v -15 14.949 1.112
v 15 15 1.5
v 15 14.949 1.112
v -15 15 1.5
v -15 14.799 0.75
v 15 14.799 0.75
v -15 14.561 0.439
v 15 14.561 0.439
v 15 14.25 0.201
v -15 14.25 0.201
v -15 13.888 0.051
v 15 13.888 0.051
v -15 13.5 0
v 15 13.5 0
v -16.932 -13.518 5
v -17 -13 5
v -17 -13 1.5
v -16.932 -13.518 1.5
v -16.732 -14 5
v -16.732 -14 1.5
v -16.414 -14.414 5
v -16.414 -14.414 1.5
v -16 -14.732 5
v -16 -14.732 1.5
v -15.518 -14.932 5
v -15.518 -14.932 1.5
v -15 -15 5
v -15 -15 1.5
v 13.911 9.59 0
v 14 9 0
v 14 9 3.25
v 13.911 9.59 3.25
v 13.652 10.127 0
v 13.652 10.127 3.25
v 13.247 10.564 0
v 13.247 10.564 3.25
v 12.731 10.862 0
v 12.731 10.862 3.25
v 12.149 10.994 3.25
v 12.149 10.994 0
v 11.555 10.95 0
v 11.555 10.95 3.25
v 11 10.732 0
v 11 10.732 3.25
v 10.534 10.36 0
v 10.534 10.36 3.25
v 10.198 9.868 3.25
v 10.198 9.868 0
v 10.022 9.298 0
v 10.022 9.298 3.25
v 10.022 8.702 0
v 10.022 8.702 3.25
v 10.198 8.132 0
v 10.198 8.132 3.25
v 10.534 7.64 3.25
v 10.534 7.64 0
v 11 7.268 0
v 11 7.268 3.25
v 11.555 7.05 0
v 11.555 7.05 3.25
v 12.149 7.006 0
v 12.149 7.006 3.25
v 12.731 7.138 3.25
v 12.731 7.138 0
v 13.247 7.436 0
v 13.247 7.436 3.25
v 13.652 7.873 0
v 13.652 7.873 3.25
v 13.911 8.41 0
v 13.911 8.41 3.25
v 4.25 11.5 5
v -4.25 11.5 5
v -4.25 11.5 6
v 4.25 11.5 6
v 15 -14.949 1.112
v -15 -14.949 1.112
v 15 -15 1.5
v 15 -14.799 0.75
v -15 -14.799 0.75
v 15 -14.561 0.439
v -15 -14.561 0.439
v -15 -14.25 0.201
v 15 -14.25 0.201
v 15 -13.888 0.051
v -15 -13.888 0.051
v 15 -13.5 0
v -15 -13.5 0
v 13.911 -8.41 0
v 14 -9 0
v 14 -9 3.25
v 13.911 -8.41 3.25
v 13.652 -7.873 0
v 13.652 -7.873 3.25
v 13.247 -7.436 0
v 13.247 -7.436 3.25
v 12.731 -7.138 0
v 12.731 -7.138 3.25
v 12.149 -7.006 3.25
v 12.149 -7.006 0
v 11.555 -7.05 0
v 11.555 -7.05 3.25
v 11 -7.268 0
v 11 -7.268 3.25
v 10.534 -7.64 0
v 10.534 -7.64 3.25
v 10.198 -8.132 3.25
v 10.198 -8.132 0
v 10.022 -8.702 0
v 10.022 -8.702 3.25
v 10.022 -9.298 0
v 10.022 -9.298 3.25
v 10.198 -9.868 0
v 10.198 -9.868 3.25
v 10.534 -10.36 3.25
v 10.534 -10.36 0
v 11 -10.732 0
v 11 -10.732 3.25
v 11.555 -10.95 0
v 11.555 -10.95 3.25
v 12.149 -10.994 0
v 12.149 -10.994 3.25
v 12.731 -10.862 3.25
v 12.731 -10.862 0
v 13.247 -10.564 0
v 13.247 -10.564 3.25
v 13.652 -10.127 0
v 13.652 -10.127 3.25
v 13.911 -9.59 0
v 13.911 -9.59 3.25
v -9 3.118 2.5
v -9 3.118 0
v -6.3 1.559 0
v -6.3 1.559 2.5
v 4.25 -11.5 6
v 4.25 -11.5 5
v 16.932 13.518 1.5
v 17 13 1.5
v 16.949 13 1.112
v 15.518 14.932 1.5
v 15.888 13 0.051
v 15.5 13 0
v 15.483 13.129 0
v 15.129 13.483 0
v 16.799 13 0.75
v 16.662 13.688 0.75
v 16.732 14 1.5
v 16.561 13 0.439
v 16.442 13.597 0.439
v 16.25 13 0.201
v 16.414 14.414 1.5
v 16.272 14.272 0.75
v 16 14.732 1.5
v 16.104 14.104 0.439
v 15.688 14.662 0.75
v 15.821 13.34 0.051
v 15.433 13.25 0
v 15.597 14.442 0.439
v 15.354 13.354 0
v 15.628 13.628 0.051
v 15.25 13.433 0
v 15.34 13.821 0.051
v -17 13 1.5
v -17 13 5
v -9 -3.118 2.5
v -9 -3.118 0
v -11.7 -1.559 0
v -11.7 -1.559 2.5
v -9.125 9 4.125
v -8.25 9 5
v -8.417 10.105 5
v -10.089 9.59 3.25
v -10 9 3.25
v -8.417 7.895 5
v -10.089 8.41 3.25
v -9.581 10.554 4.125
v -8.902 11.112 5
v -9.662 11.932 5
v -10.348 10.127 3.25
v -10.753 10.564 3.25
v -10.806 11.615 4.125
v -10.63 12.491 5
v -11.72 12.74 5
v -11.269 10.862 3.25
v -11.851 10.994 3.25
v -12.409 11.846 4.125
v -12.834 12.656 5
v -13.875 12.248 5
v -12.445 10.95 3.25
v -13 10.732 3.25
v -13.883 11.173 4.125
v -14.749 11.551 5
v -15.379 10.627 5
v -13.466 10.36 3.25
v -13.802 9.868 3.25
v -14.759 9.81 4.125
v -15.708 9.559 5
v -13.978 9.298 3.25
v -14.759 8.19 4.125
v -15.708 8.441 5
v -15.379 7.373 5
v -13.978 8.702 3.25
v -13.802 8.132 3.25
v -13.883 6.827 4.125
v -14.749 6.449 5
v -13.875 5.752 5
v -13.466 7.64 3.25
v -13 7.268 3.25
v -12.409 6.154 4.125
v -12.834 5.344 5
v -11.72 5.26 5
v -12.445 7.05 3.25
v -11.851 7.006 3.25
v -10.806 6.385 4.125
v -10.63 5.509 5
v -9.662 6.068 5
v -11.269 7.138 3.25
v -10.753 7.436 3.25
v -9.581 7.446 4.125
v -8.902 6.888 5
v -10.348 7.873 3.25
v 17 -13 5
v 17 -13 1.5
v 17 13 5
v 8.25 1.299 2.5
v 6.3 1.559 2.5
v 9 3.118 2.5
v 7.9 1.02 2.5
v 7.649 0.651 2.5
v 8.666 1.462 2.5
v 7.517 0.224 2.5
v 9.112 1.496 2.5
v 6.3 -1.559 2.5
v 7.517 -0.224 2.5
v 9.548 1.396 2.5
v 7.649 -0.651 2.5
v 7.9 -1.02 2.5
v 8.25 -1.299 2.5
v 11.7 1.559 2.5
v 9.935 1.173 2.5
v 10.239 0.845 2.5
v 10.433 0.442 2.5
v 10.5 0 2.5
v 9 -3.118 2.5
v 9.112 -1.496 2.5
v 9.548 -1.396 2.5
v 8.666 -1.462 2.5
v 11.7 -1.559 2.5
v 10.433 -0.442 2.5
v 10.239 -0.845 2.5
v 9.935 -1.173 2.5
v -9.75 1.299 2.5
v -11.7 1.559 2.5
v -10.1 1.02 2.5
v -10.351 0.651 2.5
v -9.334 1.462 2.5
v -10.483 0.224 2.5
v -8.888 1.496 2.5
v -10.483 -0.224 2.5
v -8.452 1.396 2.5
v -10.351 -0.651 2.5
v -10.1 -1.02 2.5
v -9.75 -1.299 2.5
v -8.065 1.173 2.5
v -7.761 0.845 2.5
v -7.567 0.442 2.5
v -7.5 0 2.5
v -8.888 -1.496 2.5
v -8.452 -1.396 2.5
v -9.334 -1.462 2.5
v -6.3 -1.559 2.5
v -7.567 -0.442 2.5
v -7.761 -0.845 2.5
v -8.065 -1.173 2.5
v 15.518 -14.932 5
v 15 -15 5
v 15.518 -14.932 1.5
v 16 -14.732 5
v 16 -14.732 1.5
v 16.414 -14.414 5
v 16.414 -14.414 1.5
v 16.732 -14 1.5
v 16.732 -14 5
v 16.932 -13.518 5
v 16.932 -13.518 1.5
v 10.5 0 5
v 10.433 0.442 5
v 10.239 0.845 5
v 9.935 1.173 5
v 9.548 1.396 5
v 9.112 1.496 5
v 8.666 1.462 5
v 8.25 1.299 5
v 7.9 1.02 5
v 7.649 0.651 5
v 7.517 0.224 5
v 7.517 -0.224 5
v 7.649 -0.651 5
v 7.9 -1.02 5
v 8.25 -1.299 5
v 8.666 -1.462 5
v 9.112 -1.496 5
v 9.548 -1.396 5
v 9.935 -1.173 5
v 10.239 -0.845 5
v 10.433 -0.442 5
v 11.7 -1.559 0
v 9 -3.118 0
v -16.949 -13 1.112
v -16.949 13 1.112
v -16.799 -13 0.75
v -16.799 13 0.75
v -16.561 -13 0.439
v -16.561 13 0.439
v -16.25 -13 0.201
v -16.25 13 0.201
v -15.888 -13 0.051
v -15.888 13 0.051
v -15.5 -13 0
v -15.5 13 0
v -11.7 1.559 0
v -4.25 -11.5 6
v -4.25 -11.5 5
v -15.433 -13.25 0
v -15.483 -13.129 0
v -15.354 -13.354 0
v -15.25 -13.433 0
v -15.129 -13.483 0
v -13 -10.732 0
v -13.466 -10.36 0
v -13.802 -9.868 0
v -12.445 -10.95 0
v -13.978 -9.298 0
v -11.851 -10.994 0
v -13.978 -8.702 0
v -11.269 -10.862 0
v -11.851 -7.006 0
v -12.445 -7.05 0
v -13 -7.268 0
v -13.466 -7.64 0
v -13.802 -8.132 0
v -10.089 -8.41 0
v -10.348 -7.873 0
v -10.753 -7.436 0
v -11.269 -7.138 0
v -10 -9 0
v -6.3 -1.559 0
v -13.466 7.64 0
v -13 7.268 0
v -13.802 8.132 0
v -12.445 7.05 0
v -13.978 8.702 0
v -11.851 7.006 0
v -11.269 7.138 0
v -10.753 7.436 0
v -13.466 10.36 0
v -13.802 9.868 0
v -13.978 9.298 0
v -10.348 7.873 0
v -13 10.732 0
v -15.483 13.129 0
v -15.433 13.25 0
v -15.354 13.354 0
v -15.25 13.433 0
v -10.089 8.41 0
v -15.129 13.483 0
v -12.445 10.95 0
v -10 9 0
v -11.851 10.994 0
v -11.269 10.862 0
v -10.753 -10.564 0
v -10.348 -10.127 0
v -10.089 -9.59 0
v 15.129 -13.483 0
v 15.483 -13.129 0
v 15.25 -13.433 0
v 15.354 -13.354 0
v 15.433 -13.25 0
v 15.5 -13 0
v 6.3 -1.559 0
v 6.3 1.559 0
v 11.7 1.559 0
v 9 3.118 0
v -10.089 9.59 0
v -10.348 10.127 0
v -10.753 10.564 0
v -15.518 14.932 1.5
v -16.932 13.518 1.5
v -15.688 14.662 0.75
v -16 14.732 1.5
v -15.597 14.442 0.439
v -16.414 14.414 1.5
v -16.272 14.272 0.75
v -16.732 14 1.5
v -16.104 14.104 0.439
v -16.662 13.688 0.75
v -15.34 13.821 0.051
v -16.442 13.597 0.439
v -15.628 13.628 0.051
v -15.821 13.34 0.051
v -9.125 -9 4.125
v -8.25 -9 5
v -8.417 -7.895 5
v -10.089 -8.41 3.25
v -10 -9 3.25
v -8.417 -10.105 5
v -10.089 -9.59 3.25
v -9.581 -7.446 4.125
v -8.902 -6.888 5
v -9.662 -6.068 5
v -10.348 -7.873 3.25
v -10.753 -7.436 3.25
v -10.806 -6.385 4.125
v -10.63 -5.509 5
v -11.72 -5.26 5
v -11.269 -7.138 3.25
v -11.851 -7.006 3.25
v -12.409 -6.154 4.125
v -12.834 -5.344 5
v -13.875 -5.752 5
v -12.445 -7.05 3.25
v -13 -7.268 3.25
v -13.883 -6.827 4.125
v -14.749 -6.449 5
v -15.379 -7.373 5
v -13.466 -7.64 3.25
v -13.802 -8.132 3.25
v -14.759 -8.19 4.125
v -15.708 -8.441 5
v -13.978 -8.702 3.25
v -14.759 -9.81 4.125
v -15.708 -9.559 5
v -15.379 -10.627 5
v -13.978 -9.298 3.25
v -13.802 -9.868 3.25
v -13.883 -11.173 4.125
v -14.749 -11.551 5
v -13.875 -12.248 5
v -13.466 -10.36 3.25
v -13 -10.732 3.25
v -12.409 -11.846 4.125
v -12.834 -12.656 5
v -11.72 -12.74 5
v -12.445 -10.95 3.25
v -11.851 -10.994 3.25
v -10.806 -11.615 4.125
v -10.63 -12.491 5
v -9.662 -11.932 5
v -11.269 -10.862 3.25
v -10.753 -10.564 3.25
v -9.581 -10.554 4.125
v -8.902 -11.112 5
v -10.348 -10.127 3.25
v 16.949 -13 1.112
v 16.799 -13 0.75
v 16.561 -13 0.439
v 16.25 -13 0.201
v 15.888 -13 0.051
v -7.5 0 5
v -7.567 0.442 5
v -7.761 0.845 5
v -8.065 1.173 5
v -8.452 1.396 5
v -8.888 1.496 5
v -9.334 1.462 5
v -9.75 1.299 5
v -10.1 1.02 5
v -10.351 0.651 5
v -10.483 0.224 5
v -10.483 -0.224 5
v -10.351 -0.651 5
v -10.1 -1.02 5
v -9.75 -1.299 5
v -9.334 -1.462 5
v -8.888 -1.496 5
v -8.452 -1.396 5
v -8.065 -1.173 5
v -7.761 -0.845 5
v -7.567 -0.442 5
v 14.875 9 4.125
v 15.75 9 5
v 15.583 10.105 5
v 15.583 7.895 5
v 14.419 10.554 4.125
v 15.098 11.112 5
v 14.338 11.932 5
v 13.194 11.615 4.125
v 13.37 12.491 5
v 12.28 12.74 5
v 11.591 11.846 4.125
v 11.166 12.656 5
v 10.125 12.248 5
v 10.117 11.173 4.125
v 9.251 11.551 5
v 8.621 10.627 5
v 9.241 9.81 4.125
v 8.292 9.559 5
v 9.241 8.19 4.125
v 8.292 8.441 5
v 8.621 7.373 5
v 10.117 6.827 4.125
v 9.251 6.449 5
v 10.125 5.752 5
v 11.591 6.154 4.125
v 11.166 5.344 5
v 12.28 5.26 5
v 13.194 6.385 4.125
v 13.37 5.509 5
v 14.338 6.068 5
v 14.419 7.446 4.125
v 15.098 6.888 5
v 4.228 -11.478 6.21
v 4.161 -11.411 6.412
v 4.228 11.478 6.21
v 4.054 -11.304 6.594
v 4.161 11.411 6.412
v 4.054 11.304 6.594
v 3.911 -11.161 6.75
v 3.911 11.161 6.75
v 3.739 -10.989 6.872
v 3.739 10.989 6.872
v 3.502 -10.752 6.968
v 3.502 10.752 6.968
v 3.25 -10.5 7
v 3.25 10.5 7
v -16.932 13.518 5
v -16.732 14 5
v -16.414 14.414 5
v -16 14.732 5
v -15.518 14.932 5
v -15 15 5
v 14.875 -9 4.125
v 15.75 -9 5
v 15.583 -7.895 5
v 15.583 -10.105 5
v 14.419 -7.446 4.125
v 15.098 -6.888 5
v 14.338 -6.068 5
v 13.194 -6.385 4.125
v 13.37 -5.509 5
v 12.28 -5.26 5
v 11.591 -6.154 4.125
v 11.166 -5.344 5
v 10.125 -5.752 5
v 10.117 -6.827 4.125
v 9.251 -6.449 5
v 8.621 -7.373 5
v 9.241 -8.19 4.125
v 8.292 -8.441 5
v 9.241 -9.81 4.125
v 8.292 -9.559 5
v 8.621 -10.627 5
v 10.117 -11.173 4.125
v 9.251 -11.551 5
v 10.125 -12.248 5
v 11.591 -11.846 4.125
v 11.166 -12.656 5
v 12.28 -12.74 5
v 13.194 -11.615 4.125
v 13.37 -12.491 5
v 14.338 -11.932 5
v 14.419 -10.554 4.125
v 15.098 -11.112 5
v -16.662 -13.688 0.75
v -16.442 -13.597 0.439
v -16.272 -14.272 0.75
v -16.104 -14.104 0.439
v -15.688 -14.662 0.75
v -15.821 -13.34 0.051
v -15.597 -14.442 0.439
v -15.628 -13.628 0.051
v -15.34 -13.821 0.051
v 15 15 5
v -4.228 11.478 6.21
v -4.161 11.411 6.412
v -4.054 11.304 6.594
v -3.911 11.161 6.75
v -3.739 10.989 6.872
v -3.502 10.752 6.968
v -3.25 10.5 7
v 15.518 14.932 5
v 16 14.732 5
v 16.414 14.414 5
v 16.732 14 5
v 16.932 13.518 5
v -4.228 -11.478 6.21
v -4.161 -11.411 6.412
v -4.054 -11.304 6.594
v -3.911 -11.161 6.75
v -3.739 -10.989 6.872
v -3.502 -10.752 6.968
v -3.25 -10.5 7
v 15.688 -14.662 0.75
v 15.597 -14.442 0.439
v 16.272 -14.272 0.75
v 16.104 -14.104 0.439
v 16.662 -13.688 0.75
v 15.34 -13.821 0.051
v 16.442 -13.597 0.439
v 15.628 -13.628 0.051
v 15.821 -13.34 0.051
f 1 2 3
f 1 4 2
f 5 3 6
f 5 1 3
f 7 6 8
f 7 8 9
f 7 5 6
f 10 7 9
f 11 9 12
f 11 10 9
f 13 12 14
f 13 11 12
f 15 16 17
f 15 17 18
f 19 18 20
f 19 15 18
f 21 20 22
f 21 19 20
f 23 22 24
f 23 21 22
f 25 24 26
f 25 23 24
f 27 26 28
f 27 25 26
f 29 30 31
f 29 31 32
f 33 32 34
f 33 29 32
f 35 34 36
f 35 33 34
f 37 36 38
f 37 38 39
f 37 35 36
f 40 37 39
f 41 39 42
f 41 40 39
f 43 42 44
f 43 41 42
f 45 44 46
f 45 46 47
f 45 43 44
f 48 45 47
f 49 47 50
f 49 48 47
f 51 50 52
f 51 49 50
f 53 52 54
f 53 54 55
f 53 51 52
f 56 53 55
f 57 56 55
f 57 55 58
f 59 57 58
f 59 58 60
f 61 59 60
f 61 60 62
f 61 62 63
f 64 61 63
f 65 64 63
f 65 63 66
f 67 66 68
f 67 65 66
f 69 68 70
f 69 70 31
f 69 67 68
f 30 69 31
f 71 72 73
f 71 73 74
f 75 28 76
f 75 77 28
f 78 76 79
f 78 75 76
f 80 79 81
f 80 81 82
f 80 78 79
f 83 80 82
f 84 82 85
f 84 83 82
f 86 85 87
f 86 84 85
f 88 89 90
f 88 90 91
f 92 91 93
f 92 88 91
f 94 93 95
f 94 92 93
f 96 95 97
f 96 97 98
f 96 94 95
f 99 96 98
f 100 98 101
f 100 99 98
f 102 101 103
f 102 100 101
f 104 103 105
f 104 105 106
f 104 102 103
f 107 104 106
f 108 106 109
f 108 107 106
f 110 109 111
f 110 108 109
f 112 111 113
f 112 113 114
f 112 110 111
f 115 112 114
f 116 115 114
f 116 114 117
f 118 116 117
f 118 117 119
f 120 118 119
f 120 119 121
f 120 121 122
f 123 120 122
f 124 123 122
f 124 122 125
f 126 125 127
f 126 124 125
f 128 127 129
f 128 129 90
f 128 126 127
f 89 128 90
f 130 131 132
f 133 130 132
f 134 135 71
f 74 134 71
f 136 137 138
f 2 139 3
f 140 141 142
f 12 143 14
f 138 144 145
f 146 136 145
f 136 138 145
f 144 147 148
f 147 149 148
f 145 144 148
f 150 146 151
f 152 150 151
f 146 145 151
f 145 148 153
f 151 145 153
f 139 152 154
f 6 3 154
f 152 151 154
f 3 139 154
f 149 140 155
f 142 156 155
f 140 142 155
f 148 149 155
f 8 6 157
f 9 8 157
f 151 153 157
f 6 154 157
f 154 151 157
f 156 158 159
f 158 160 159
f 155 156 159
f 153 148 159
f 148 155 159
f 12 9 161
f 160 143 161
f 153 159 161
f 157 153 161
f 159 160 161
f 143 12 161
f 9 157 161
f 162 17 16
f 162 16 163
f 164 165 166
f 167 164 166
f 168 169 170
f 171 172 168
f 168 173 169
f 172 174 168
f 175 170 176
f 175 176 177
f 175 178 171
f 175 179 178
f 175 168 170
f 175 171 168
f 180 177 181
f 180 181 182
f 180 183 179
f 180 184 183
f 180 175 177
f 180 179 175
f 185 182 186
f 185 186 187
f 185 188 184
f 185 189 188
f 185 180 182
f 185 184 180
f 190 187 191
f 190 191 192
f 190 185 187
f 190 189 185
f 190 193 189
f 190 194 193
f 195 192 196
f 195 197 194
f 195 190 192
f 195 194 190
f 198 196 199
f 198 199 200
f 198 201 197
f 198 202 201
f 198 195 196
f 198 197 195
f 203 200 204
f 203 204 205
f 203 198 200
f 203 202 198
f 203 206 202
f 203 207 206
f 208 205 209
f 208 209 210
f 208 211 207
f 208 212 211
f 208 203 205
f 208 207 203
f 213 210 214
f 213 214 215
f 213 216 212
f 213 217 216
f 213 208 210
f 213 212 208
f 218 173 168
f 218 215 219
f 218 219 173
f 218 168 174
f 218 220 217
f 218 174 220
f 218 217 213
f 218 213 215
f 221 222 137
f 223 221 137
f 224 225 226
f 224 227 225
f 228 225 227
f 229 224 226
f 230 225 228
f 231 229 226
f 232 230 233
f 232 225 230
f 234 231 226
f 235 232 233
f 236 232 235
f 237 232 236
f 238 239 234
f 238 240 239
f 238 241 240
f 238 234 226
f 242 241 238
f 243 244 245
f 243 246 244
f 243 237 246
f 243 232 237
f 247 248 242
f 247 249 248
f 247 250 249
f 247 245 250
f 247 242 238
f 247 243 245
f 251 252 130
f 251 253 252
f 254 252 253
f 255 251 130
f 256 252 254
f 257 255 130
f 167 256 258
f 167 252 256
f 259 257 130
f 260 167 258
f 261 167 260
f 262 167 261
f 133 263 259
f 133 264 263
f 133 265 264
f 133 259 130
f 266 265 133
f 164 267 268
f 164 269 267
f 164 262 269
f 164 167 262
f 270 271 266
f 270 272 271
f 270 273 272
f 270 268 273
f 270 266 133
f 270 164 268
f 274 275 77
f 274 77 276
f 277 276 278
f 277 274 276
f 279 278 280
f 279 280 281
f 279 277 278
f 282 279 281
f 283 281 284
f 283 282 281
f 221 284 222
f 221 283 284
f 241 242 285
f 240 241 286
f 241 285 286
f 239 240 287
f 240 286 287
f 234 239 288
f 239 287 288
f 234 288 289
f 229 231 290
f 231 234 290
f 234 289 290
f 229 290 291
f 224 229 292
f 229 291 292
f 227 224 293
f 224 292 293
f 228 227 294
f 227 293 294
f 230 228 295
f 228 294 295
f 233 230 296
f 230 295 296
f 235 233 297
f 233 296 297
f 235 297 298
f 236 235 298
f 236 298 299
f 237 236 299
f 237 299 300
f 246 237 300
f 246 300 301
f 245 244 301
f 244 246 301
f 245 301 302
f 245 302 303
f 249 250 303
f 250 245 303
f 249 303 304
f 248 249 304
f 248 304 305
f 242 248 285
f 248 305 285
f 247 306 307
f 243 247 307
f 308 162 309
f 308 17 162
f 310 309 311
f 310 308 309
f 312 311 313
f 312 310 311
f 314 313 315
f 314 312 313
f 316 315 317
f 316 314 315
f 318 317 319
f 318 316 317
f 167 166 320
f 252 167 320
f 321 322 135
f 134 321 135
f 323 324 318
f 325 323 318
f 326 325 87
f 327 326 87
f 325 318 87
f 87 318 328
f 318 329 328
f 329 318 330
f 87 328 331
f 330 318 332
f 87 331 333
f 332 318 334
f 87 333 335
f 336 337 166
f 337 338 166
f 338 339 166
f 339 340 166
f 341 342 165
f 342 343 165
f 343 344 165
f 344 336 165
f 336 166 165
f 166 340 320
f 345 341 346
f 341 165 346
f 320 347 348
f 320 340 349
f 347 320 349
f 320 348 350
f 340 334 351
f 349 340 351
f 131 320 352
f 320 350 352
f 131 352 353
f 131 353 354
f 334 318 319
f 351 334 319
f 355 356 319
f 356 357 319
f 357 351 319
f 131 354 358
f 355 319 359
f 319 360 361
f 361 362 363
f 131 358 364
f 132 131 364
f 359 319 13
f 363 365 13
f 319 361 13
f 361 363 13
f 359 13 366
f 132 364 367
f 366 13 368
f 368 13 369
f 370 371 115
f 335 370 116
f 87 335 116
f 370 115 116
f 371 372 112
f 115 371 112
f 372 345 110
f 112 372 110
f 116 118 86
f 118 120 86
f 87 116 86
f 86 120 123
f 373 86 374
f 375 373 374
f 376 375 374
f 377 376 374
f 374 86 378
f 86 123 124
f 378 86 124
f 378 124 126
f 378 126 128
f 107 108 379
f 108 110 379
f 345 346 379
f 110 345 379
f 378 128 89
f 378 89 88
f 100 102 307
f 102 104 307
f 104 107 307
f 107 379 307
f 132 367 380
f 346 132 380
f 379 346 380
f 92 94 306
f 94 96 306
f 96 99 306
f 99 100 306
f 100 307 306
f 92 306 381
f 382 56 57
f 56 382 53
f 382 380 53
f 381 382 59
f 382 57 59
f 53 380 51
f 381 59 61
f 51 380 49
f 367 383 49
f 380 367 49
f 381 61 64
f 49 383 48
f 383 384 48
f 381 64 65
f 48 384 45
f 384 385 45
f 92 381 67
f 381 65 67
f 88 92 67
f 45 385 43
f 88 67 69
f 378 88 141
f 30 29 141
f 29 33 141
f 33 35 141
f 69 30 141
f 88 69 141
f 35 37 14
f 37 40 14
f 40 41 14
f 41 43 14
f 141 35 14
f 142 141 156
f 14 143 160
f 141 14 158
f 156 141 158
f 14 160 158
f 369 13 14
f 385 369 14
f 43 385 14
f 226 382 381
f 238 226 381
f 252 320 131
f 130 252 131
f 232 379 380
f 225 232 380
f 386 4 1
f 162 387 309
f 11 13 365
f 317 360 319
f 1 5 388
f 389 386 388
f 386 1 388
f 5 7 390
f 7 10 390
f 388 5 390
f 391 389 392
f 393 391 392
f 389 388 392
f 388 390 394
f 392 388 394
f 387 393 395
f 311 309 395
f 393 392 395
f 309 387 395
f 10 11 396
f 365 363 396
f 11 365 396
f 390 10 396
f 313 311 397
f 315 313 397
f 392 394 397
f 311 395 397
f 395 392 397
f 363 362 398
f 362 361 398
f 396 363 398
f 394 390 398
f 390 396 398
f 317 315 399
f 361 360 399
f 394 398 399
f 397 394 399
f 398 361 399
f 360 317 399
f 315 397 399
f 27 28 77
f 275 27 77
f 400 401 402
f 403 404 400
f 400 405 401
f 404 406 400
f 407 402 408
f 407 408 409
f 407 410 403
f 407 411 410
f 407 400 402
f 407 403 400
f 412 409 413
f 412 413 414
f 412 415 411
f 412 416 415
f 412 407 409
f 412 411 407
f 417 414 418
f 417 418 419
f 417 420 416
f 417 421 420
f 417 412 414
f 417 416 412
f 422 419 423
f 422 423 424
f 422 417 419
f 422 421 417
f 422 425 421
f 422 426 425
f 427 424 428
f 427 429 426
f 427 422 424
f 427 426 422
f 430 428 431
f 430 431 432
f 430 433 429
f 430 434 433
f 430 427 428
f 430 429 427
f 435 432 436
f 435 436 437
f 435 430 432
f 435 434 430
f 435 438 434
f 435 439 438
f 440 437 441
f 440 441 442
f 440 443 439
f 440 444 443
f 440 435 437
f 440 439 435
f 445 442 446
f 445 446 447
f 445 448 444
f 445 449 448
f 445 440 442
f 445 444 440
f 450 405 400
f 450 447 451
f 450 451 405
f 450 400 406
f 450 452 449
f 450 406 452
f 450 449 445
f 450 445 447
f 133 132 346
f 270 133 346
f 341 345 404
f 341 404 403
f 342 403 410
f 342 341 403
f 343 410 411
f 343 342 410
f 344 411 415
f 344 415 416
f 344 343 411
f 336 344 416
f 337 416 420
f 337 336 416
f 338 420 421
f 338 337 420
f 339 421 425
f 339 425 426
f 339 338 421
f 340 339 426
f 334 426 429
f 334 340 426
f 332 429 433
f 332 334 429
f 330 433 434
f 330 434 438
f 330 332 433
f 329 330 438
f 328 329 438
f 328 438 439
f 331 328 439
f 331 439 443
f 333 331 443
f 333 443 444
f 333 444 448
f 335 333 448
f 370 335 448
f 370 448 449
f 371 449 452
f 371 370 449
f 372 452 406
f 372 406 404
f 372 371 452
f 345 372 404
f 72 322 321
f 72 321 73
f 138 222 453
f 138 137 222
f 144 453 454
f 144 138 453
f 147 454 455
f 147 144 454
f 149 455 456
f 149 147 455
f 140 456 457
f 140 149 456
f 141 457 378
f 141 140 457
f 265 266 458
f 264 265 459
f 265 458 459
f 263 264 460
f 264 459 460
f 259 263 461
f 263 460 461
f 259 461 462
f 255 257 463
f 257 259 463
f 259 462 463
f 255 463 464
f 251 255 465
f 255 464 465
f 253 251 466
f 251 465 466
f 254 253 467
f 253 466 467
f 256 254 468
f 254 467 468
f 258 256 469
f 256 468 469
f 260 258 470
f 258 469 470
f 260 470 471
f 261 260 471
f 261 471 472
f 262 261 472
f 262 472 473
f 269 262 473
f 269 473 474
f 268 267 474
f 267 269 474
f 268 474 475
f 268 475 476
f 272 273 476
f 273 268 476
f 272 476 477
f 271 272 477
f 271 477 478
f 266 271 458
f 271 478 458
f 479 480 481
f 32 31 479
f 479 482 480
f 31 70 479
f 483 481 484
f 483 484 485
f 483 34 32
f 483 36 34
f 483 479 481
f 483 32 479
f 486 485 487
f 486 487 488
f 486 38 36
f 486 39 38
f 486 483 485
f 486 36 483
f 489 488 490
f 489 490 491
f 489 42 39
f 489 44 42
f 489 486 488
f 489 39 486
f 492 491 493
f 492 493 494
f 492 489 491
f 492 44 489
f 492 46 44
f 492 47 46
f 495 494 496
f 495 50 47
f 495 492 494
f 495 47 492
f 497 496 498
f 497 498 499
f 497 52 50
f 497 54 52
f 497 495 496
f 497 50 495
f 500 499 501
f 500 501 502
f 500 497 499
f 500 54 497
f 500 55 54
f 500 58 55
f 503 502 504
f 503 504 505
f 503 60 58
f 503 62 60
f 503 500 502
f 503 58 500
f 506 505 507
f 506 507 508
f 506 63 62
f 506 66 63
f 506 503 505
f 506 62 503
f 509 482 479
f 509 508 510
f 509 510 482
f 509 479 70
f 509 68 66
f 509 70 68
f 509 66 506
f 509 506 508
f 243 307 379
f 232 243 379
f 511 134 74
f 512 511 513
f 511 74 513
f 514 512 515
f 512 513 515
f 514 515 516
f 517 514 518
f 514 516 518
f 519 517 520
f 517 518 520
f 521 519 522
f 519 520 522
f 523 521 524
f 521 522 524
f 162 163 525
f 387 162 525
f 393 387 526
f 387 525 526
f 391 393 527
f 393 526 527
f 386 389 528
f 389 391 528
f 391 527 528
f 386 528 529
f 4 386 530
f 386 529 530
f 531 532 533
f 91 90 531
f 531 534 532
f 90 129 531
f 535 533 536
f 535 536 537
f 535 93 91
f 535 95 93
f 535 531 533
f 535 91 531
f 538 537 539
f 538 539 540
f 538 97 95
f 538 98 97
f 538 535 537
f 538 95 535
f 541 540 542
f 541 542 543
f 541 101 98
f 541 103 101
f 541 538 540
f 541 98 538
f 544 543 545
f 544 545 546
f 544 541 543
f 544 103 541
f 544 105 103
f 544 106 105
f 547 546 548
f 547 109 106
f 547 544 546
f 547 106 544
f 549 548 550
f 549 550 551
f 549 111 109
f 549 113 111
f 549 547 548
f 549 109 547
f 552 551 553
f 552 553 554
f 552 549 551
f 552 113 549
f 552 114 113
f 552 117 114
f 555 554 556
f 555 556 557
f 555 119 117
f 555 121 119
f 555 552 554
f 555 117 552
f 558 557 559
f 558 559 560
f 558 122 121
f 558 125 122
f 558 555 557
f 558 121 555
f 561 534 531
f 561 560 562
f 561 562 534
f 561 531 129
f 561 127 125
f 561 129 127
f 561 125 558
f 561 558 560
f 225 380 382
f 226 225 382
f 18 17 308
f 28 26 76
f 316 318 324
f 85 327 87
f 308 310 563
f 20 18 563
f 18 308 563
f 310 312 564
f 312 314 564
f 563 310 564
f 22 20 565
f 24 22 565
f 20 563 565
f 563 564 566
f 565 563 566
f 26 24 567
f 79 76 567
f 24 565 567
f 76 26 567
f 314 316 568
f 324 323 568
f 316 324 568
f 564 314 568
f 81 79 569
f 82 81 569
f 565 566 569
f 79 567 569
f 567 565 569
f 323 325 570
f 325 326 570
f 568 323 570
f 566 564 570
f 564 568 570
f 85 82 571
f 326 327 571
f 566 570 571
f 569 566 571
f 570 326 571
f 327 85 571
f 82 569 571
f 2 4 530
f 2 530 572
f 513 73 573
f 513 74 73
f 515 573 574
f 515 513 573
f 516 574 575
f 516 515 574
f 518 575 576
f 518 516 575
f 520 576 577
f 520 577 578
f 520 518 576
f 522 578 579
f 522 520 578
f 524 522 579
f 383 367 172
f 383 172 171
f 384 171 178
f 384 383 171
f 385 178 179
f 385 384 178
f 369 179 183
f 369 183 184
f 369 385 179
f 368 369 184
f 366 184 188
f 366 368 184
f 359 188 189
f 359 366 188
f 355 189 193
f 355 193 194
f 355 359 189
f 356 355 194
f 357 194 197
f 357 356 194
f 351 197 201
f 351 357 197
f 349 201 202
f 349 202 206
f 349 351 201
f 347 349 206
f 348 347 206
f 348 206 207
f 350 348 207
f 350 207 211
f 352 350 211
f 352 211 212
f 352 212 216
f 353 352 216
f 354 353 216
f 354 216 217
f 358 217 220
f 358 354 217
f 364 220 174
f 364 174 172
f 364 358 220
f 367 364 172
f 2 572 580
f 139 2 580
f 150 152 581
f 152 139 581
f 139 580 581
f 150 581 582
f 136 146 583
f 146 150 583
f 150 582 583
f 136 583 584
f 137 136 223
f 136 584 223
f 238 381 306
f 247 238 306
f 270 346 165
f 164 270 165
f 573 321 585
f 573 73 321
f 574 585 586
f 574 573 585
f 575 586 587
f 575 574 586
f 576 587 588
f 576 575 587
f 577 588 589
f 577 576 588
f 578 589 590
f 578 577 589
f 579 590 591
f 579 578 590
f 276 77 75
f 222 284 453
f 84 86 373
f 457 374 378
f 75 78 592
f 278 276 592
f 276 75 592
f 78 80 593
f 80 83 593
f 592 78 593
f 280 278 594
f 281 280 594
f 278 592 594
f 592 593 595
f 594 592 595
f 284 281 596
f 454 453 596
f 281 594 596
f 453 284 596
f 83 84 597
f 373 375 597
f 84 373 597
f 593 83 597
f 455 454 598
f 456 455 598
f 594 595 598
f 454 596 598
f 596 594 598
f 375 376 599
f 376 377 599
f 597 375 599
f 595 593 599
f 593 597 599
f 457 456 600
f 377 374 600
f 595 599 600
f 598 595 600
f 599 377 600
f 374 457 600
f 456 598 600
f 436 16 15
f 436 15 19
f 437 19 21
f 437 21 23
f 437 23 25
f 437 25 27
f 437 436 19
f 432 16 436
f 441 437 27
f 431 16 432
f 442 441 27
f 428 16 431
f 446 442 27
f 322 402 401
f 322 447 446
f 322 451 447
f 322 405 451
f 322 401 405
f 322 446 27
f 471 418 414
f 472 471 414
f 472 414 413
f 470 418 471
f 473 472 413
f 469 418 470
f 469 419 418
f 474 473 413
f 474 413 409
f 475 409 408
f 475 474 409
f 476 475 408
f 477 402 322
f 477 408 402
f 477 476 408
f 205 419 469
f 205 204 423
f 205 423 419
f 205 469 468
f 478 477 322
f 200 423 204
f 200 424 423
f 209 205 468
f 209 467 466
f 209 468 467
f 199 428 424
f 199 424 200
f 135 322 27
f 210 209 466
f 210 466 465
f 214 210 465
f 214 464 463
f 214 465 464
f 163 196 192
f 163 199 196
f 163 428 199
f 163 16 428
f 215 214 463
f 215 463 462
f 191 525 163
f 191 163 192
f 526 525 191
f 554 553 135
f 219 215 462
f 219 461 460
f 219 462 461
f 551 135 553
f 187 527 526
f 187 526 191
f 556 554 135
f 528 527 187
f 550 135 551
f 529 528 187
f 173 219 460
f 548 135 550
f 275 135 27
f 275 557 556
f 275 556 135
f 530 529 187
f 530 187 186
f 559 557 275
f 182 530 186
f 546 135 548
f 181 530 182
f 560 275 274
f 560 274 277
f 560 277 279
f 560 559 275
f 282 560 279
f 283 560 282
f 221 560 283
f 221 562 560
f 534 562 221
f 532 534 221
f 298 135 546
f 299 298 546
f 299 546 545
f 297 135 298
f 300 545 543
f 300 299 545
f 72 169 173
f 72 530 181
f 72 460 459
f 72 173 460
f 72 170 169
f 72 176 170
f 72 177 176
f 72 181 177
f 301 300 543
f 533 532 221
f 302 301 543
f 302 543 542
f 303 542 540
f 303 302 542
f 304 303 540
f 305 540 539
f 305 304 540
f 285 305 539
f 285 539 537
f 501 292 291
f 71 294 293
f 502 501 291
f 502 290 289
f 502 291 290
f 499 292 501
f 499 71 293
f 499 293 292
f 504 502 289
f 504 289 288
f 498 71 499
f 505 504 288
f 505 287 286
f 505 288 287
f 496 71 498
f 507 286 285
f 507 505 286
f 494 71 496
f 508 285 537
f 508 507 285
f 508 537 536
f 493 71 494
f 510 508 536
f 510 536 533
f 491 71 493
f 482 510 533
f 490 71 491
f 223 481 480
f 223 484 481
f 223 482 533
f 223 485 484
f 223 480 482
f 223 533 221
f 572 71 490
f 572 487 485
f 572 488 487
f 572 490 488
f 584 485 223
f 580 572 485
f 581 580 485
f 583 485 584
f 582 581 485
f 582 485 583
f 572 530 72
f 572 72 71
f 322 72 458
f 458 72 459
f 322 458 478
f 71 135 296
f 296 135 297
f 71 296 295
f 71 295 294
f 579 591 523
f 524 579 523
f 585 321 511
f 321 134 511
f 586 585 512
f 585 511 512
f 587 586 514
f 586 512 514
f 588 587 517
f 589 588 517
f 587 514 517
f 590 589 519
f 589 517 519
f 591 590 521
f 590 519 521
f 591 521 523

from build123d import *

# Parameters (mm, degrees)
F0_W      = 34
F0_H      = 30
F0_R      = 2
F1_DEPTH  = 5
F2_R      = 1.5
F3_DEPTH  = 5
F4_SIZE   = 1.75
F5_R      = 1.5
F6_DEPTH  = 2.5
F8_R      = 2
F9_R      = 1.5
F10_W     = 8.5
F10_H     = 23
F11_DEPTH = 2
F12_R     = 1


with BuildPart() as f1:
    # F0 (on Top) → F1 (new body)
    with BuildSketch(Plane.XY):
        Rectangle(F0_W, F0_H)
        with Locations((-12, -9)):
            Circle(F0_R, mode=Mode.SUBTRACT)
        with Locations((12, -9)):
            Circle(F0_R, mode=Mode.SUBTRACT)
        with Locations((-12, 9)):
            Circle(F0_R, mode=Mode.SUBTRACT)
        with Locations((12, 9)):
            Circle(F0_R, mode=Mode.SUBTRACT)
    extrude(amount=F1_DEPTH)

    # F2 (on face) → F3 (cut, through all)
    with BuildSketch(Plane.XY.offset(5)):
        with Locations((9, 0)):
            Circle(F2_R)
        with Locations((-9, 0)):
            Circle(F2_R)
    extrude(amount=-F3_DEPTH, mode=Mode.SUBTRACT)

    # F4
    f4_edges = [f1.edges().sort_by_distance(p)[0] for p in [
        (-14, -9, 5),
        (-14, 9, 5),
        (10, 9, 5),
        (10, -9, 5),
    ]]
    chamfer(f4_edges, length=F4_SIZE)

    # F5 (on face) → F6 (cut)
    with BuildSketch(Plane(origin=(0, 0, 0), x_dir=(1, 0, 0), z_dir=(0, 0, -1))):
        Polygon((-6.3, -1.558846), (-6.3, 1.558846), (-9, 3.117691), (-11.7, 1.558846), (-11.7, -1.558846), (-9, -3.117691), align=None)
        with Locations((-9, 0)):
            Circle(F5_R, mode=Mode.SUBTRACT)
        Polygon((6.3, 1.558846), (6.3, -1.558846), (9, -3.117691), (11.7, -1.558846), (11.7, 1.558846), (9, 3.117691), align=None)
        with Locations((9, 0)):
            Circle(F5_R, mode=Mode.SUBTRACT)
    extrude(amount=-F6_DEPTH, mode=Mode.SUBTRACT)

    # F8
    f8_edges = [f1.edges().sort_by_distance(p)[0] for p in [
        (17, -15, 2.5),
        (17, 15, 2.5),
        (-17, -15, 2.5),
        (-17, 15, 2.5),
    ]]
    fillet(f8_edges, radius=F8_R)

    # F9
    f9_edges = [f1.edges().sort_by_distance(p)[0] for p in [
        (0, -15, 0),
    ]]
    fillet(f9_edges, radius=F9_R)

    # F10 (on face) → F11 (join)
    with BuildSketch(Plane.XY.offset(5)):
        Rectangle(F10_W, F10_H)
    extrude(amount=F11_DEPTH)

    # F12
    f12_edges = [f1.edges().sort_by_distance(p)[0] for p in [
        (0, -11.5, 7),
        (4.25, 0, 7),
        (-4.25, 0, 7),
        (0, 11.5, 7),
    ]]
    fillet(f12_edges, radius=F12_R)


solid = f1.part
